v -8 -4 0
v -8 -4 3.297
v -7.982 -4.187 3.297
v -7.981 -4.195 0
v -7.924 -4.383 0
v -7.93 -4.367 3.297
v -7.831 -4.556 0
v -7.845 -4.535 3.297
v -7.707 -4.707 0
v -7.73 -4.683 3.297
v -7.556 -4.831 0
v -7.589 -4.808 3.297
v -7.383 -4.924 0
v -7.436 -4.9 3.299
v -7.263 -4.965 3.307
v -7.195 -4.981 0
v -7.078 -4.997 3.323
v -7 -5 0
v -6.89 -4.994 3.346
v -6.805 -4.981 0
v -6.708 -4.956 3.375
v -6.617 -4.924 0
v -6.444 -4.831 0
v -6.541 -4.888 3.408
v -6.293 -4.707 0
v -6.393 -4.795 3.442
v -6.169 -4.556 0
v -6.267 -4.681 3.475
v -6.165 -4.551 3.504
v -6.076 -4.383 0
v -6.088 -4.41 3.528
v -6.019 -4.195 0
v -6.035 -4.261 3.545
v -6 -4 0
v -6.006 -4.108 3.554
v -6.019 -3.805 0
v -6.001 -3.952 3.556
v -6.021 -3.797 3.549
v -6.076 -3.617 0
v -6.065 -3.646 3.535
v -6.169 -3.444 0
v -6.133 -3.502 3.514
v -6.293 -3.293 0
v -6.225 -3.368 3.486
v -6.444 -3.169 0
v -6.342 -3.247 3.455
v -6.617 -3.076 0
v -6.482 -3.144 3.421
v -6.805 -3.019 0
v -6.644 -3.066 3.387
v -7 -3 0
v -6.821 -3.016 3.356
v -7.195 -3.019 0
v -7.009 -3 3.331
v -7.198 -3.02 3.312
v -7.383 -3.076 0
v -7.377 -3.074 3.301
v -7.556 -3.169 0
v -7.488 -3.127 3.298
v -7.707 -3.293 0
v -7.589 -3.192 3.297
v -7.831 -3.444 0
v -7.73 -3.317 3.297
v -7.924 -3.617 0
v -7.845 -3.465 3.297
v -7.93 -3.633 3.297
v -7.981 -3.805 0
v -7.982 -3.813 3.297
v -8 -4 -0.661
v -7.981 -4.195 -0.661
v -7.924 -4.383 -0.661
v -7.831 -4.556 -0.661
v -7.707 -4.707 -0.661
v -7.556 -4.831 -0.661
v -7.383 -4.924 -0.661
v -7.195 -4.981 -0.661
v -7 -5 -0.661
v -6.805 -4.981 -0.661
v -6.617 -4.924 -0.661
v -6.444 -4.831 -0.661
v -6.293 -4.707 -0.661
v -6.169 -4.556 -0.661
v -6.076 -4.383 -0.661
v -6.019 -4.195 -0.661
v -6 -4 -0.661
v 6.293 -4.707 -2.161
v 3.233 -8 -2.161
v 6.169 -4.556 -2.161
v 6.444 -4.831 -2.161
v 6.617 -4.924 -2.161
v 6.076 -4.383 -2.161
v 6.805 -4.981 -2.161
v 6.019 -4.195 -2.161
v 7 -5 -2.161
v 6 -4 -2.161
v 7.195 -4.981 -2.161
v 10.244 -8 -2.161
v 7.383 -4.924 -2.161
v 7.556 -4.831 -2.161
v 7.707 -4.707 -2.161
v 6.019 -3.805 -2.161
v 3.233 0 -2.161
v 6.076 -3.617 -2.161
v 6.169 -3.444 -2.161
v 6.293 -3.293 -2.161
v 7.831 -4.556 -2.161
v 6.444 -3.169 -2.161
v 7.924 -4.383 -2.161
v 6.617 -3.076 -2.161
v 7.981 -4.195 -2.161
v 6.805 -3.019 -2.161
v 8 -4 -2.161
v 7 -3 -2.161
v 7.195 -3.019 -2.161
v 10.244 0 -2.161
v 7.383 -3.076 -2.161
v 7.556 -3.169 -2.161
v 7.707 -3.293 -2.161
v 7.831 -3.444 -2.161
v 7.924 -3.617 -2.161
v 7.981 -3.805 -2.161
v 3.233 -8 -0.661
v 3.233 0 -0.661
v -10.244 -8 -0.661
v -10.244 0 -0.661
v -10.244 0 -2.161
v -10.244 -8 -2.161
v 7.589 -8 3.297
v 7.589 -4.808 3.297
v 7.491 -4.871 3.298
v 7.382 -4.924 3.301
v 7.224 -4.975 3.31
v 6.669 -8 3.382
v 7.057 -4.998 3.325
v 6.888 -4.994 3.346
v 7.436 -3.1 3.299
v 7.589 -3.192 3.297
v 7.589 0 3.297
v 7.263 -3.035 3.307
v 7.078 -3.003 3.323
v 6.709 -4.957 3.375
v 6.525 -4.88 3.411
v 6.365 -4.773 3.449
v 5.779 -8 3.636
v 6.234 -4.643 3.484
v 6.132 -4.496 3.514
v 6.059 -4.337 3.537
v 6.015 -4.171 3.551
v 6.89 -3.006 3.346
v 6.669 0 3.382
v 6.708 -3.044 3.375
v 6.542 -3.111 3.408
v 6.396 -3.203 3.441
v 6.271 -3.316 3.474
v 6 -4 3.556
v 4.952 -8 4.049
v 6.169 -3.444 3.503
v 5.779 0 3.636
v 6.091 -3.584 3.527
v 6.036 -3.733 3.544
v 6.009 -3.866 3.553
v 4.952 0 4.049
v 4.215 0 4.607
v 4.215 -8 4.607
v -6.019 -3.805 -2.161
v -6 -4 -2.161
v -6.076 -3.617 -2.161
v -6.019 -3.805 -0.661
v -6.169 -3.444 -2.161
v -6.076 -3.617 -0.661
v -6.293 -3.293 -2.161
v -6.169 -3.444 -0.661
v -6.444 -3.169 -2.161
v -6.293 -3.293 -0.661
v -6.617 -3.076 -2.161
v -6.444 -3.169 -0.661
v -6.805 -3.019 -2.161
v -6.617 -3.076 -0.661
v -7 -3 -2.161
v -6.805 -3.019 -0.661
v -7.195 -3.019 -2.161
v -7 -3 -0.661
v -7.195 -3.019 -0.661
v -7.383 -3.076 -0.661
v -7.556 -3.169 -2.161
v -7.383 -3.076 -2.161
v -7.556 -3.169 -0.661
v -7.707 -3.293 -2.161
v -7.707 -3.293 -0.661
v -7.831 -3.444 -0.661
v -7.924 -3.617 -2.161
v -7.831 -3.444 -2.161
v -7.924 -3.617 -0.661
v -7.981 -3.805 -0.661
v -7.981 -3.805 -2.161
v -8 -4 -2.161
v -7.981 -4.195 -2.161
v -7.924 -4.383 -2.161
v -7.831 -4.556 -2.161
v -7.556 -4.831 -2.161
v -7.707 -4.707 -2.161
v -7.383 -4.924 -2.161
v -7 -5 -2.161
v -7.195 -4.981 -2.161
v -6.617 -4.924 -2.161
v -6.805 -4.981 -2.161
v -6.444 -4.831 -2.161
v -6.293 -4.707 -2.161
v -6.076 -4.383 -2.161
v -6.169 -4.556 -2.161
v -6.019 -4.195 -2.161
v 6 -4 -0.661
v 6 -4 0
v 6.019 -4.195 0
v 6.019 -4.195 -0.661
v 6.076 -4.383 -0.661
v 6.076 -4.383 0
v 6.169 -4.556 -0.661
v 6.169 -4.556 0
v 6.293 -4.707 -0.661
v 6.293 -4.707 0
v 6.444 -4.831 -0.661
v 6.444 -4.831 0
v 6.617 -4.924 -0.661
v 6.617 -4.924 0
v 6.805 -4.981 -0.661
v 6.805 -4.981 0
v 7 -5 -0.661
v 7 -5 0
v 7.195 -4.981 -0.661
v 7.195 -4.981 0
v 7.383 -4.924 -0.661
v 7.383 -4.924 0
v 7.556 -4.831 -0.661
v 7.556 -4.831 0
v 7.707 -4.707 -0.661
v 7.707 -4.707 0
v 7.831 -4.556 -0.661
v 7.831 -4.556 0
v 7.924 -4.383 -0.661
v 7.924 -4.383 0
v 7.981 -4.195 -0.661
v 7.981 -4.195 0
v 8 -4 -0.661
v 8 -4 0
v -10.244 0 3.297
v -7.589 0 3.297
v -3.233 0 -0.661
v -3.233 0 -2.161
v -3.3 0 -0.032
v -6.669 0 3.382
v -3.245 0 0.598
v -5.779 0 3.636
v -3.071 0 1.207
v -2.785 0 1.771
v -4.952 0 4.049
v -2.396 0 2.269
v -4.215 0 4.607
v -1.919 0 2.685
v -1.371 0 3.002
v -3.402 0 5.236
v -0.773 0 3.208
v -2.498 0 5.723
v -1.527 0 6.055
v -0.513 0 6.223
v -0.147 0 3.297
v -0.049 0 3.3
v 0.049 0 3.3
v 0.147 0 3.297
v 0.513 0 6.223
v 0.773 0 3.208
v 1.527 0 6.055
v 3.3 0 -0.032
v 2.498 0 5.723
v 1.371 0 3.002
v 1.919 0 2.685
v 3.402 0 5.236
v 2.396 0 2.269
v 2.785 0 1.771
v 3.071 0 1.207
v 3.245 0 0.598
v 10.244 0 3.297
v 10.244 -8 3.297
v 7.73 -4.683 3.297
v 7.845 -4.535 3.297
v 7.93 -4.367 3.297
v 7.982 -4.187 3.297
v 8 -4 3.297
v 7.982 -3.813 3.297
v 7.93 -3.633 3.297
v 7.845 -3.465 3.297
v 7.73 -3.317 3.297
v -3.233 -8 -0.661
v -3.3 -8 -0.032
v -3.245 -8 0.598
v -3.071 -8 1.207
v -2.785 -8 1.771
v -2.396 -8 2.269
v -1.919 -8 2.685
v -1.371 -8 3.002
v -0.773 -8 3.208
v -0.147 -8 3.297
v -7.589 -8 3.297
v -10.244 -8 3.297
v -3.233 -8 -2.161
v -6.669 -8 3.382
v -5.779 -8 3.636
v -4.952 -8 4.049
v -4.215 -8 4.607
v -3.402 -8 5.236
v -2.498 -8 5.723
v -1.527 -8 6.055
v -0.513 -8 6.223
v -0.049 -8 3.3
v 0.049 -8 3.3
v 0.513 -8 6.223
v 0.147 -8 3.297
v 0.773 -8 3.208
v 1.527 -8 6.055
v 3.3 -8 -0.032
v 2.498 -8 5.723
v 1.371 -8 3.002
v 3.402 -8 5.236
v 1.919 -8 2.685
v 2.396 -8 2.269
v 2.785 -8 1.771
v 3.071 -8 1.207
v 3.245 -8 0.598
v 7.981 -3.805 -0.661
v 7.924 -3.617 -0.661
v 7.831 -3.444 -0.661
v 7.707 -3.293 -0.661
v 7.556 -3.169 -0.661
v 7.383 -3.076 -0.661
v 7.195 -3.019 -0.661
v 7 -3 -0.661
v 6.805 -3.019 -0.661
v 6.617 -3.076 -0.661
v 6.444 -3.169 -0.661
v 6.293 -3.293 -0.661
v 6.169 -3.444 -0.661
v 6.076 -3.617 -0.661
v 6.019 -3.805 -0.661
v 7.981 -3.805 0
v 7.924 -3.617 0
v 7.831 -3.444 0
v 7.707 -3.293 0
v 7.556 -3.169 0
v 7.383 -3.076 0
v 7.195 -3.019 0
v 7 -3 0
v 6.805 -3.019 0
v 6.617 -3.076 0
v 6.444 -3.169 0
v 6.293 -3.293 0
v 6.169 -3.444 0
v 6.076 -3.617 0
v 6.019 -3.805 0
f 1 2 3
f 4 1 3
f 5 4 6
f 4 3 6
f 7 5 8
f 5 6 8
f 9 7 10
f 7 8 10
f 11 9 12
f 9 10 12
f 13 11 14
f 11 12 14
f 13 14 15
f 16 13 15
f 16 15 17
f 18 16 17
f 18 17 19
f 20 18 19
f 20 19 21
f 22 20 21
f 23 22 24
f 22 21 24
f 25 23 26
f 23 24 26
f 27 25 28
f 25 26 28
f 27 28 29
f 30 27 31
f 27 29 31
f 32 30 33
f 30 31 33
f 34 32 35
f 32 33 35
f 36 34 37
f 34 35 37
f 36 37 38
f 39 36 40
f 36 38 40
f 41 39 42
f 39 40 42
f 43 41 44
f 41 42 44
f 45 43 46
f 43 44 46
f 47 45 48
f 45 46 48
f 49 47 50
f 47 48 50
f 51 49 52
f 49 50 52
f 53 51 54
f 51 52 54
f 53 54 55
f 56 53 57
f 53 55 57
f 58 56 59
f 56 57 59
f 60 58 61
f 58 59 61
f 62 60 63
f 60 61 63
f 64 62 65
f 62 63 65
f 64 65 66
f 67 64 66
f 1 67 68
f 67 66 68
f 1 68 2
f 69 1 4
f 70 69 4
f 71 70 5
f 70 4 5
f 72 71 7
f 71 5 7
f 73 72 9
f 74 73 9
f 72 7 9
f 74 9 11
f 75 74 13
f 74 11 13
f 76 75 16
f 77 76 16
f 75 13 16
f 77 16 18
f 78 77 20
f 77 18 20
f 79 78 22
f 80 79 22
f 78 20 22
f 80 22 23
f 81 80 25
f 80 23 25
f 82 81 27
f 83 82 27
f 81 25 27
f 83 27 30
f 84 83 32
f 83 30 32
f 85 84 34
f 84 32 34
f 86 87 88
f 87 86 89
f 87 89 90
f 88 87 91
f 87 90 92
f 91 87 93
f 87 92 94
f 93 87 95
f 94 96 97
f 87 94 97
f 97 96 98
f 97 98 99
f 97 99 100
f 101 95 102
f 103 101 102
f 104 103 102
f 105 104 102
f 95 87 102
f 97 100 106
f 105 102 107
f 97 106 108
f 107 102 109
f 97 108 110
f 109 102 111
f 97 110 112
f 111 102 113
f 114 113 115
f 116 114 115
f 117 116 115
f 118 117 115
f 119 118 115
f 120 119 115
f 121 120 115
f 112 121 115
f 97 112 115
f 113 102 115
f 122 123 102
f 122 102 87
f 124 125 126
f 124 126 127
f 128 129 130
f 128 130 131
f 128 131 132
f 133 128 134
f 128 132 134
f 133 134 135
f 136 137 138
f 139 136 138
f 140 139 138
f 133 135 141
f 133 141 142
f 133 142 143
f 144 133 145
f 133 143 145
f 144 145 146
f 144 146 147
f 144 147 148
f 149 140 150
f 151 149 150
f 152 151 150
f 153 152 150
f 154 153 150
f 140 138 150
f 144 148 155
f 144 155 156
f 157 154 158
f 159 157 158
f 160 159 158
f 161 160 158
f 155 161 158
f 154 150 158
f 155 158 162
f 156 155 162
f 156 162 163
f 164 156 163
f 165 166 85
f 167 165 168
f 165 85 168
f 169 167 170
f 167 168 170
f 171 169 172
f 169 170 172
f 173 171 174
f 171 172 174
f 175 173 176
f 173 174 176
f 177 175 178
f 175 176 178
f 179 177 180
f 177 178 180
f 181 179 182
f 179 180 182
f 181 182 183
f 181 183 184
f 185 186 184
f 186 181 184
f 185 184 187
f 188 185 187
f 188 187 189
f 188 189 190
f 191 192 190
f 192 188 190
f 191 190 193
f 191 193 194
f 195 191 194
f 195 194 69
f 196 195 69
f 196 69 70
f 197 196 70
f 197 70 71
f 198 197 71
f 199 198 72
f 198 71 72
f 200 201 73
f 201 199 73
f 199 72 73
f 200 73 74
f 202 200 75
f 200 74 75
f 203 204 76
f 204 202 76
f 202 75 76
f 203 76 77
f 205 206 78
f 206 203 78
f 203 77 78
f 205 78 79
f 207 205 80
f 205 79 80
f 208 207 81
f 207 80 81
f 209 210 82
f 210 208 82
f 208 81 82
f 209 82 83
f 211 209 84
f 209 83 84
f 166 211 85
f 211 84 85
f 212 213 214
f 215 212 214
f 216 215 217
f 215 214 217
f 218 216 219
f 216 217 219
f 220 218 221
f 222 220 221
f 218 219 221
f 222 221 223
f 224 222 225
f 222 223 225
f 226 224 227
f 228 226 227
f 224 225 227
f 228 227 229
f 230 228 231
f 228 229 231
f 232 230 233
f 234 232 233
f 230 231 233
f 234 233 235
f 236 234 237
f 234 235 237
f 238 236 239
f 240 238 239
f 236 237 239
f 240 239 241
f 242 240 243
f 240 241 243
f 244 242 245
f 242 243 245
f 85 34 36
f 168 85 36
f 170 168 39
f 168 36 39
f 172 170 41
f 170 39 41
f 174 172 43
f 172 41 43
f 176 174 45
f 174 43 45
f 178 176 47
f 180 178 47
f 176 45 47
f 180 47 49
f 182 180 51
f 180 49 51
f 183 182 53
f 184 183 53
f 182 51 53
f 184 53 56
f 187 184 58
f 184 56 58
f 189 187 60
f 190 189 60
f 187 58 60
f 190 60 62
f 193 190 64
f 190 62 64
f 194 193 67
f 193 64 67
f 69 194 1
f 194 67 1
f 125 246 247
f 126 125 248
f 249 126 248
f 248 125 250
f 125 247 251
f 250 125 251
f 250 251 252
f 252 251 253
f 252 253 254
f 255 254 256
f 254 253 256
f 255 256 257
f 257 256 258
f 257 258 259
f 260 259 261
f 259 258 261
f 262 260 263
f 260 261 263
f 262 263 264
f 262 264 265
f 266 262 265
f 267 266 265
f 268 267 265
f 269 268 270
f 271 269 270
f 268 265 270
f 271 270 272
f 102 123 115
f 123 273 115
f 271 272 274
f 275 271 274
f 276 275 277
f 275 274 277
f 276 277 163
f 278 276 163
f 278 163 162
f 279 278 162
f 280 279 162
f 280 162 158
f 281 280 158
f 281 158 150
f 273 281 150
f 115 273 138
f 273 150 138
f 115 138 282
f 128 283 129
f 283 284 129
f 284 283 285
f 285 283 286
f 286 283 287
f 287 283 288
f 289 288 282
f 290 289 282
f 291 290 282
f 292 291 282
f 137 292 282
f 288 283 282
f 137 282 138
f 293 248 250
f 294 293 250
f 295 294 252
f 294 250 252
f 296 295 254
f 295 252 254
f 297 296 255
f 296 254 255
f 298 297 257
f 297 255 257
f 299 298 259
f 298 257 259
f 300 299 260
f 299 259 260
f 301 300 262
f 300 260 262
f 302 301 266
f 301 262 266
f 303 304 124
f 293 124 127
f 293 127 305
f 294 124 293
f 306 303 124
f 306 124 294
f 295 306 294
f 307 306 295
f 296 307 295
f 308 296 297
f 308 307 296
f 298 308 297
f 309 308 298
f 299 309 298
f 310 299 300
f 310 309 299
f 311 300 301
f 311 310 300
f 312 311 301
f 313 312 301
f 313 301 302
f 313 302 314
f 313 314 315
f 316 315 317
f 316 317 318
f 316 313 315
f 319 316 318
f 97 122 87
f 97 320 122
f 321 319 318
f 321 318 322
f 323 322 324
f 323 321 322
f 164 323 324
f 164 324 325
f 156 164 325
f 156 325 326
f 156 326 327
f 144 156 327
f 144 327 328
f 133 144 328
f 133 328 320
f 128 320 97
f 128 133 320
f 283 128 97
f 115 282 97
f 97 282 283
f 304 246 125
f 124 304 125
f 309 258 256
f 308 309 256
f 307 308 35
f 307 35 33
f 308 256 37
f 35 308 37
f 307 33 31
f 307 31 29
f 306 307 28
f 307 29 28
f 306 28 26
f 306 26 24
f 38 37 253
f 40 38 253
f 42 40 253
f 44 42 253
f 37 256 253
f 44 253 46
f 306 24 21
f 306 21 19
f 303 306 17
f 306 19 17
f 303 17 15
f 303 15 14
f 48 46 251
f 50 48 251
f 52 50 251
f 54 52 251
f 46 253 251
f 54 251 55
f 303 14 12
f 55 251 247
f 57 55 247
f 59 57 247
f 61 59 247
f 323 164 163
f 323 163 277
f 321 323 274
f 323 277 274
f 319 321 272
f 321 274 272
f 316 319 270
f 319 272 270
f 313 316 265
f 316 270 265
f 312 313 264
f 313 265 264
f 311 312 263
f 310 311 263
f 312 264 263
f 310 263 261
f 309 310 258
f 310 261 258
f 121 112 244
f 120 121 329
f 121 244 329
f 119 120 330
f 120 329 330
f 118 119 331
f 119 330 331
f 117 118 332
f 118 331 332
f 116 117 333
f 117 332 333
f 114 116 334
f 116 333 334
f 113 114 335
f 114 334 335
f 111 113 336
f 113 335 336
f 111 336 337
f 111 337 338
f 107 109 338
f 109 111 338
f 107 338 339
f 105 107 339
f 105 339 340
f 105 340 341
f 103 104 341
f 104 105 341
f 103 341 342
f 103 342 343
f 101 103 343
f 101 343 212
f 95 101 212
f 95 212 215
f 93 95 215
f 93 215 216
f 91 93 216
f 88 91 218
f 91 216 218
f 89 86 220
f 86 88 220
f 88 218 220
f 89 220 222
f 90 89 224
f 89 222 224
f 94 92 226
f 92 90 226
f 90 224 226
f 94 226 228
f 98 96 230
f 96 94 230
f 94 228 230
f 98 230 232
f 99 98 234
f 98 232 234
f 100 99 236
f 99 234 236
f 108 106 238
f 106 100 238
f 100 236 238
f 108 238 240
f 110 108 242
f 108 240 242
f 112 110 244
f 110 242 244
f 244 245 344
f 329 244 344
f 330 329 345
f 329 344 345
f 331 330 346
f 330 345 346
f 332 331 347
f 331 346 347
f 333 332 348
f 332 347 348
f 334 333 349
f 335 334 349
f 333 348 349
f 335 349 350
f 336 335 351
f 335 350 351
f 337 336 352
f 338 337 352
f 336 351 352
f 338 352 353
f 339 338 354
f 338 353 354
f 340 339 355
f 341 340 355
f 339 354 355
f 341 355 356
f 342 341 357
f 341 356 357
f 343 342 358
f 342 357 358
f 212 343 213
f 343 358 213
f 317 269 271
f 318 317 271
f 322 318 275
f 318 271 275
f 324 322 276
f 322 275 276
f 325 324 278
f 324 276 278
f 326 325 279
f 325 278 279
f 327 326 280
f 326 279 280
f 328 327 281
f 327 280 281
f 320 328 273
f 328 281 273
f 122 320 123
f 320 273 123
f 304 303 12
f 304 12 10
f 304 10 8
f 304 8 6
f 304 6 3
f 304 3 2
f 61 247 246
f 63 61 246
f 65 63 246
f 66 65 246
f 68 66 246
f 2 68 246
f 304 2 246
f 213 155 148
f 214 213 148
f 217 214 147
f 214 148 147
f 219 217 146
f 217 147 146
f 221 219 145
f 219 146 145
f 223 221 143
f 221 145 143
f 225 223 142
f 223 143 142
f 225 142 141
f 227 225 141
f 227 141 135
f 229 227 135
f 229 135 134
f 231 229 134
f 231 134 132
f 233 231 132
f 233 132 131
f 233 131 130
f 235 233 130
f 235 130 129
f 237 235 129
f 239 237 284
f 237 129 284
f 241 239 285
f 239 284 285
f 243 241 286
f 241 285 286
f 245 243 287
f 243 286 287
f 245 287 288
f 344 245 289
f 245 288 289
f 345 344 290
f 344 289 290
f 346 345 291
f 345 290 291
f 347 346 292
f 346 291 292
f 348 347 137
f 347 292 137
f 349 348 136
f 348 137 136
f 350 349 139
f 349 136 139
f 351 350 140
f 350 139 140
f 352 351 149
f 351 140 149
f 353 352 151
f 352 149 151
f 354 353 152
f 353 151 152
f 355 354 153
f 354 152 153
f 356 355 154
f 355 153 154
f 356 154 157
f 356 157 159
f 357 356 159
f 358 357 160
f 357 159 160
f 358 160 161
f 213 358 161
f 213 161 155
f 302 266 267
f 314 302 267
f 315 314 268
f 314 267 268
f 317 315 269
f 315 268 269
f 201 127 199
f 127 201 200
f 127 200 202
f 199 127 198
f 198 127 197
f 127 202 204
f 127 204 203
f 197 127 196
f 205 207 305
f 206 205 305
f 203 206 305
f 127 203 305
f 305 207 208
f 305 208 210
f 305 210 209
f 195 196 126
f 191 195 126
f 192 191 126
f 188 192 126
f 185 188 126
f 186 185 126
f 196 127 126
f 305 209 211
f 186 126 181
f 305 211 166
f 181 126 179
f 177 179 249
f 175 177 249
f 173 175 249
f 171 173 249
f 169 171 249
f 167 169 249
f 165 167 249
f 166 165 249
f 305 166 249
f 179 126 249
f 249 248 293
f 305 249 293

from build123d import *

# Parameters (mm, degrees)
F1_DEPTH = 8
F3_D     = 2
F3_DEPTH = 0.6618861731
F4_D     = 2
F5_DEPTH = 1.5


with BuildPart() as f1:
    # F0 (on Front) → F1 (new body)
    with BuildSketch(Plane.XZ):
        with BuildLine():
            ThreePointArc((0.1467019637, 3.2967375591), (2.6022180015, 2.0293992886), (3.2331454446, -0.6608861731))
            Line((3.2331454446, -0.6608861731), (10.2443375631, -0.6608861731))
            Line((10.2443375631, -0.6608861731), (10.2443375631, 3.2967375591))
            Line((10.2443375631, 3.2967375591), (7.589418496, 3.2967375591))
            ThreePointArc((7.589418496, 3.2967375591), (5.7792360743, 3.6359179316), (4.2146449918, 4.6074417191))
            ThreePointArc((4.2146449918, 4.6074417191), (0, 6.2443375631), (-4.2146449918, 4.6074417191))
            ThreePointArc((-4.2146449918, 4.6074417191), (-5.7792360743, 3.6359179316), (-7.589418496, 3.2967375591))
            Line((-7.589418496, 3.2967375591), (-10.2443375631, 3.2967375591))
            Line((-10.2443375631, 3.2967375591), (-10.2443375631, -0.6608861731))
            Line((-10.2443375631, -0.6608861731), (-3.2331454446, -0.6608861731))
            ThreePointArc((-3.2331454446, -0.6608861731), (-2.6022180015, 2.0293992886), (-0.1467019637, 3.2967375591))
            ThreePointArc((-0.1467019637, 3.2967375591), (0, 3.3), (0.1467019637, 3.2967375591))
        make_face()
    extrude(amount=F1_DEPTH)

    # F3 (through all, one way)
    with BuildSketch(Plane.XY):
        with Locations((-7, -4), (7, -4)):
            Circle(F3_D / 2)
    extrude(amount=-F3_DEPTH, mode=Mode.SUBTRACT)

    # F4 (through all)
    with Locations(Plane(origin=(0, 0, 0), x_dir=(1, 0, 0), z_dir=(0, 0, -1))):
        with Locations((-7, 4), (7, 4)):
            Hole(F4_D / 2)

    # F5 (add): faces of the model
    f5_faces = [f1.faces().sort_by_distance(p)[0] for p in [
        (3.3395206367, -4, -0.6608861731),
        (-10.137962371, -4, -0.6608861731),
    ]]
    extrude(f5_faces, amount=F5_DEPTH)


solid = f1.part
